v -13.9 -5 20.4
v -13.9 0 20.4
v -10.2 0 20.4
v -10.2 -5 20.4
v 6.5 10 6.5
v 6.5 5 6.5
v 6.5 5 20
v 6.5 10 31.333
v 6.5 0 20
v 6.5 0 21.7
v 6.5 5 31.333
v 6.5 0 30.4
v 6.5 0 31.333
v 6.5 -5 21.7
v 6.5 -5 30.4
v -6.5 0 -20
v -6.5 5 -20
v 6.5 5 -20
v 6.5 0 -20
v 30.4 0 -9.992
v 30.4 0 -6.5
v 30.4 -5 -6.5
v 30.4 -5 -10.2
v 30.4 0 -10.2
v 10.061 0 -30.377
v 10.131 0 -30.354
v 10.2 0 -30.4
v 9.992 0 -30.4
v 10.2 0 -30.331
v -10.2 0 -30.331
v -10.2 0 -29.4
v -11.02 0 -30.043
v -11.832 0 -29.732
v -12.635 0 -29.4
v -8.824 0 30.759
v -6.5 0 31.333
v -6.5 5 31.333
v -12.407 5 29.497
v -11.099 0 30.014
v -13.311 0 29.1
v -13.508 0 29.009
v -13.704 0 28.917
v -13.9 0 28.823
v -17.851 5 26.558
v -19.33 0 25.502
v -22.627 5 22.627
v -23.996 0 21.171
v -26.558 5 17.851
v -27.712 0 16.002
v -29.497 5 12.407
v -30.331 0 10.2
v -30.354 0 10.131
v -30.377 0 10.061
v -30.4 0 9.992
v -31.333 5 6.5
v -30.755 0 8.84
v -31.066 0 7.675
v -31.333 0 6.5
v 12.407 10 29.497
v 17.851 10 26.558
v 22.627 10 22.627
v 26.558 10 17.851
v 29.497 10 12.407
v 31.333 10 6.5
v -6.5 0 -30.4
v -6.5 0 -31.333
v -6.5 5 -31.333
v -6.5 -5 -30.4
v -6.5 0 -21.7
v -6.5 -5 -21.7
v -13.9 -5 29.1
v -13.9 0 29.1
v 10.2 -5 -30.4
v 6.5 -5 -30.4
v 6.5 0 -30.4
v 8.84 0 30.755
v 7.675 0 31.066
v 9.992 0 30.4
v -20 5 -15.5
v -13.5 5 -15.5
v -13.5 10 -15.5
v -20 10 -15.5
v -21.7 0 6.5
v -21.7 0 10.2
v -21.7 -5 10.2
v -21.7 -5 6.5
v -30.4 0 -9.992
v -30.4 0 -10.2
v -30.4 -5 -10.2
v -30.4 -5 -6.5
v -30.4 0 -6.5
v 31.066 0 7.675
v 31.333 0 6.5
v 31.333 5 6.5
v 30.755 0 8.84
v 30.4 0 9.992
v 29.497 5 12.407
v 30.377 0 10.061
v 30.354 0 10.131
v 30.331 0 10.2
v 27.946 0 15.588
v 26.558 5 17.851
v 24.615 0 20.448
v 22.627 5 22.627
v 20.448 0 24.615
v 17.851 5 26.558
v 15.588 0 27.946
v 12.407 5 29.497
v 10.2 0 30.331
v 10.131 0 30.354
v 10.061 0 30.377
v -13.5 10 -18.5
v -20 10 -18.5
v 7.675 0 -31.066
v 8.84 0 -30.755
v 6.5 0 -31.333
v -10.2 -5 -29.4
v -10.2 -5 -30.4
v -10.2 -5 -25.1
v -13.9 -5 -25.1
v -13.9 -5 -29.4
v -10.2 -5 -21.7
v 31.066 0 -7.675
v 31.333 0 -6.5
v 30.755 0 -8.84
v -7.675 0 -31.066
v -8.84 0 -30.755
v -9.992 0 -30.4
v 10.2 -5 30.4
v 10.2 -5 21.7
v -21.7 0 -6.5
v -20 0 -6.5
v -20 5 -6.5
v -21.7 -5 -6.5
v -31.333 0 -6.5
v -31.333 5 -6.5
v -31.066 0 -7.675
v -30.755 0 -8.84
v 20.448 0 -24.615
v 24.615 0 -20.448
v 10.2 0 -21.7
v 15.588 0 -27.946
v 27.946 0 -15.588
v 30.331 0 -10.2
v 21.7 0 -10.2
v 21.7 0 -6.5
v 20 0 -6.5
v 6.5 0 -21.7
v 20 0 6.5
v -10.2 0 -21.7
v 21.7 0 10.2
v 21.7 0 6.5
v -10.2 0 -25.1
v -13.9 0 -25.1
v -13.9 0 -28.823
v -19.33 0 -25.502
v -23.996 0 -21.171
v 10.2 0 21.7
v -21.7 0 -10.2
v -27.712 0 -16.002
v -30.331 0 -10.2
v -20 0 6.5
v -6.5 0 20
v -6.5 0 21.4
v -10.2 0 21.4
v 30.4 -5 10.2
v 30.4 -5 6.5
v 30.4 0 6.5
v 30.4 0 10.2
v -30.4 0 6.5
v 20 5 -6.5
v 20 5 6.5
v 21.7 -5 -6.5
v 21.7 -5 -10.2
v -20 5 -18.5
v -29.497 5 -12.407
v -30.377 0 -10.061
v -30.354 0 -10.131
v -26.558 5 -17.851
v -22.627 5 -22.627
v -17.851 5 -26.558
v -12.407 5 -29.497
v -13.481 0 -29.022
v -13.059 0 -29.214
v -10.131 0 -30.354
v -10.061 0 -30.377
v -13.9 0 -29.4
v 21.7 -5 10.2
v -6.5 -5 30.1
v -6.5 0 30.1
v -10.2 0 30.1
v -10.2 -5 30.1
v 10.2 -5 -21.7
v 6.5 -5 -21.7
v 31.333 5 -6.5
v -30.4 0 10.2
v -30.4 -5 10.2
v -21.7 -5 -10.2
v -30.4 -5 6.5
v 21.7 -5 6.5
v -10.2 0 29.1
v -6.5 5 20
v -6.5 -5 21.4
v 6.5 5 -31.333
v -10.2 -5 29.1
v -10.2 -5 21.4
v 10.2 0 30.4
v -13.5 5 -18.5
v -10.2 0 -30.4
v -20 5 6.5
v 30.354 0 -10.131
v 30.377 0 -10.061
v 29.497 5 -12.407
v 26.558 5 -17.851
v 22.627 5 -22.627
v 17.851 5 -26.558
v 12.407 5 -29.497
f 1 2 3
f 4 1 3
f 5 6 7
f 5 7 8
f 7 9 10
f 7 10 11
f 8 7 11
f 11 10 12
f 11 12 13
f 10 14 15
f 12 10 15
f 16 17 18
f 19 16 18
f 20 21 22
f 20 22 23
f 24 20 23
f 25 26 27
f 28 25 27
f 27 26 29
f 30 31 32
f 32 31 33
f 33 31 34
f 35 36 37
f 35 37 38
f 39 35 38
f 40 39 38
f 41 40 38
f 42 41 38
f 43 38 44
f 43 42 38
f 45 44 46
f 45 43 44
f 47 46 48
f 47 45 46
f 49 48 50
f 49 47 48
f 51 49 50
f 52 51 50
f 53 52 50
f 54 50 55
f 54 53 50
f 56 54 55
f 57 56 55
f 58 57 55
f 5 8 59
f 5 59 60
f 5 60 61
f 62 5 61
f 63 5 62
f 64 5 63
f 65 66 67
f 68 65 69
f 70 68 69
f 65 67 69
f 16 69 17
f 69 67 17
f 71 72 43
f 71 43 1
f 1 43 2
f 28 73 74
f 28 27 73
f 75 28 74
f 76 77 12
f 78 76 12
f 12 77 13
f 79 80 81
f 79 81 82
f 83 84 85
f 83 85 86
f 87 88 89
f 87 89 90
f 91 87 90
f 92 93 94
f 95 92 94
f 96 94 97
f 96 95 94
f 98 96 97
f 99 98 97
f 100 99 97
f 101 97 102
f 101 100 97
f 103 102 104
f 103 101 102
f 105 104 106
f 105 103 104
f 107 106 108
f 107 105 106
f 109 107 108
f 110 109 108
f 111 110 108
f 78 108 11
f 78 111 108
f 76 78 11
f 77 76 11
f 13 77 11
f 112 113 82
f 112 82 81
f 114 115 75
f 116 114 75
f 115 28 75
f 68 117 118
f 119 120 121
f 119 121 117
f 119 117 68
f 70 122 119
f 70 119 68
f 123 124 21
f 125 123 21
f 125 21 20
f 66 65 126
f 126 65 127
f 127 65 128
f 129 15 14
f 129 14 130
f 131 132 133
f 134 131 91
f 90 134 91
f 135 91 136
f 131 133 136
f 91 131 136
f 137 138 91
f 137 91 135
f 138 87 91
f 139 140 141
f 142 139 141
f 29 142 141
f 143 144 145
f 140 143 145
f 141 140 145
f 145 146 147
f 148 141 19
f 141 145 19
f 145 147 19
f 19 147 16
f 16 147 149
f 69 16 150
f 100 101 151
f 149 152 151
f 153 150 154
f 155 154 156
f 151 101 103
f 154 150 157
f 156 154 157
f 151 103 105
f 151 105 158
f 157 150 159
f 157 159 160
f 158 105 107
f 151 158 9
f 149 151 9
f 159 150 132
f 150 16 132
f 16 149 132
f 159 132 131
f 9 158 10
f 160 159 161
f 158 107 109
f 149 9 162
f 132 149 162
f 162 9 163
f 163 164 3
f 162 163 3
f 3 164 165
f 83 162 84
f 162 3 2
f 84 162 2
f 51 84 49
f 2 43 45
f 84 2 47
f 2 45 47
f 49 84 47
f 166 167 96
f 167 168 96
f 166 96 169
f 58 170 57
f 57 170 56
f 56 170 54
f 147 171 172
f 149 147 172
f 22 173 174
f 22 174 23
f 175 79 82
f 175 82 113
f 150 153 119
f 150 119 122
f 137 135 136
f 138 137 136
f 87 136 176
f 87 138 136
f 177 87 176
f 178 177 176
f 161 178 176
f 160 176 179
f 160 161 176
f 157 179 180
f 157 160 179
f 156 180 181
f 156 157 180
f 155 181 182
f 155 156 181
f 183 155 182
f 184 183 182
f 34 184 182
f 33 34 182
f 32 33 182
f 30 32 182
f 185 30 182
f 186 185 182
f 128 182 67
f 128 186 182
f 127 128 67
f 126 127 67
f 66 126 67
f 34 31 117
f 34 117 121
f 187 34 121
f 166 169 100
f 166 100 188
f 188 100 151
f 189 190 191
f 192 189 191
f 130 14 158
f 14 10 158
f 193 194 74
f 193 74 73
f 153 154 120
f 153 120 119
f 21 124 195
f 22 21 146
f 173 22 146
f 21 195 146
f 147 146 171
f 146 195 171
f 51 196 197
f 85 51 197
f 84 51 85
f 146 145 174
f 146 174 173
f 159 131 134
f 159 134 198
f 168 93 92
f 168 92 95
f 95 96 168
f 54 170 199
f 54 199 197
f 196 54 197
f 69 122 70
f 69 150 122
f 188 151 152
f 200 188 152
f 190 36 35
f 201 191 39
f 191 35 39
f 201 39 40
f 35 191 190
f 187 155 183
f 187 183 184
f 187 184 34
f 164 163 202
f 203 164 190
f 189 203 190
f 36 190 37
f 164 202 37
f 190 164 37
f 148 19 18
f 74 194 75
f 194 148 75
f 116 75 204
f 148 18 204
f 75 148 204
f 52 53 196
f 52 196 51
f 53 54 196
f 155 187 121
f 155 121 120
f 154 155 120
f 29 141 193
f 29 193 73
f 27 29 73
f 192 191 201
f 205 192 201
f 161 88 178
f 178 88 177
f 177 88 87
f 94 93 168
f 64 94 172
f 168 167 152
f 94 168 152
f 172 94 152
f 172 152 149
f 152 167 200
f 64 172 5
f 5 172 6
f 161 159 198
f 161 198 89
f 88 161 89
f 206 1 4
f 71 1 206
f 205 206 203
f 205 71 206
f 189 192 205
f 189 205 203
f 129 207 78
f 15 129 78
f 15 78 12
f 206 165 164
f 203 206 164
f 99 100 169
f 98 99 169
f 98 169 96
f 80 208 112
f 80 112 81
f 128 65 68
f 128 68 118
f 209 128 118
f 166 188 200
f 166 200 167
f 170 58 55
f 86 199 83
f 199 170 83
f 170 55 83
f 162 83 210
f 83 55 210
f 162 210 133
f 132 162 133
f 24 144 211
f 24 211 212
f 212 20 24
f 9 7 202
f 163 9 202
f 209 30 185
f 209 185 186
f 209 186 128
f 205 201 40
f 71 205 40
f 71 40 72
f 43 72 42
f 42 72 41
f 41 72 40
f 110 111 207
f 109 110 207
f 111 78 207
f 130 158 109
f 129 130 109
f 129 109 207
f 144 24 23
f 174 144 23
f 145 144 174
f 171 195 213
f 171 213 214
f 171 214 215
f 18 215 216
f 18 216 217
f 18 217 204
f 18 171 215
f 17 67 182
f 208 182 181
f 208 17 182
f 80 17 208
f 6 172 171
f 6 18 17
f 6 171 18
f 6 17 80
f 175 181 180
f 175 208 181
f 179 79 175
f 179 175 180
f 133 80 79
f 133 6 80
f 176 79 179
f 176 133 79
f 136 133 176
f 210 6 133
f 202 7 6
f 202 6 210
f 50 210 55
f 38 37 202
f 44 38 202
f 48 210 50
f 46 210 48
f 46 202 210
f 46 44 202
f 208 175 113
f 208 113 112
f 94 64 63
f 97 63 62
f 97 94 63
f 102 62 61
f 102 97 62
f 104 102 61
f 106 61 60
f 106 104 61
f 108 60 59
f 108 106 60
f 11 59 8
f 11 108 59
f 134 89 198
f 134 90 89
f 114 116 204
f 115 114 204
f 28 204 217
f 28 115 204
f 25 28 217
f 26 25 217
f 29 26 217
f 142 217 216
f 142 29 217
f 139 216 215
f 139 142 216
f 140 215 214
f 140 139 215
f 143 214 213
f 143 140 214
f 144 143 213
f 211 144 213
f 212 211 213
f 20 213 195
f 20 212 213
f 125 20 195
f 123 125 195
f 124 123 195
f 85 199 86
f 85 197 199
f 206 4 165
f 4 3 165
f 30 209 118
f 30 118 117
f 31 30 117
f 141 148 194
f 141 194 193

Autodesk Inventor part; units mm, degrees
ref_plane "YZ Plane" through (0, 0, 0) normal (1, 0, 0) x (0, 1, 0)
ref_plane "XZ Plane" through (0, 0, 0) normal (0, 1, 0) x (-1, 0, 0)
ref_plane "XY Plane" through (0, 0, 0) normal (0, 0, 1) x (1, 0, 0)
sketch "Sketch4" plane through (0, 0, 0) normal (0, 1, 0) x (-1, 0, 0)
  circle A0 centre (0, 0) radius 32
  dimension "d48" = 64
extrude "Extrusion1" add sketch "Sketch4" along normal blind 5
sketch "Sketch5" plane through (0, 5, 0) normal (0, 1, 0) x (1, 0, 0)
  line L0 (-6.5, -32) -> (6.5, -32)
  line L1 (6.5, -32) -> (6.5, -20)
  line L2 (6.5, -20) -> (-6.5, -20)
  line L3 (-6.5, -20) -> (-6.5, -32)
  line L4 (-32, -6.5) -> (-20, -6.5)
  line L5 (-20, -6.5) -> (-20, 6.5)
  line L6 (-20, 6.5) -> (-32, 6.5)
  line L7 (-32, 6.5) -> (-32, -6.5)
  line L8 (-6.5, 20) -> (6.5, 20)
  line L9 (6.5, 20) -> (6.5, 32)
  line L10 (6.5, 32) -> (-6.5, 32)
  line L11 (-6.5, 32) -> (-6.5, 20)
  line L12 (20, -6.5) -> (32, -6.5)
  line L13 (32, -6.5) -> (32, 6.5)
  line L14 (32, 6.5) -> (20, 6.5)
  line L15 (20, 6.5) -> (20, -6.5)
  line L16 (0, 0) -> (-6.9492, 0)
  line L17 (0, 0) -> (0, 8.4834)
  dimension "d51" = 13
  dimension "d52" = 12
  dimension "d53" = 12
  dimension "d54" = 13
  dimension "d57" = 13
  dimension "d58" = 12
  dimension "d59" = 12
  dimension "d60" = 13
  dimension "d61" = 40
  dimension "d62" = 40
extrude "Extrusion2" cut sketch "Sketch5" against normal blind 5
sketch "Sketch6" plane through (0, 5, 0) normal (0, 1, 0) x (1, 0, 0)
  arc A0 (6.5, -31.3329) -> (31.3329, -6.5) centre (0, 0) ccw projected
  line L0 (31.3329, -6.5) -> (6.5, -6.5)
  line L1 (6.5, -6.5) -> (6.5, -31.3329)
  line L2 (6.5, -31.3329) -> (6.5, -20) projected
  arc A1 (6.5, -31.3329) -> (31.3329, -6.5) centre (0, 0) ccw
extrude "Extrusion3" add sketch "Sketch6" along normal blind 5
sketch "Sketch7" plane through (0, 5, 0) normal (0, 1, 0) x (1, 0, 0)
  line L0 (-20, 6.5) -> (-20, -6.5) projected
  line L1 (-20, 6.5) -> (-20, 20)
  line L2 (6.5, 20) -> (-6.5, 20) projected
  line L3 (-6.5, 20) -> (-20, 20)
  line L4 (-20, 18.5) -> (-13.5, 18.5)
  line L5 (-13.5, 18.5) -> (-13.5, 15.5)
  line L6 (-13.5, 15.5) -> (-20, 15.5)
  line L7 (-20, 15.5) -> (-20, 18.5)
  line L8 (-6.5, 20) -> (-6.5, 31.3329) projected
  point P0 (0, 0)
  dimension "d69" = 7
  dimension "d70" = 1.5
  dimension "d71" = 6.5
  dimension "d72" = 3
extrude "Extrusion4" add sketch "Sketch7" along normal blind 5
sketch "Sketch8" plane through (0, 0, 0) normal (0, -1, 0) x (1, 0, 0)
  point P0 (0, 0)
sketch "Sketch9" plane through (0, 0, 0) normal (0, -1, 0) x (1, 0, 0)
  line L0 (-31.3329, -6.5) -> (-20, -6.5) projected
  line L1 (-30.4, -6.5) -> (-21.7, -6.5)
  line L2 (-21.7, -6.5) -> (-21.7, -10.2)
  line L3 (-21.7, -10.2) -> (-30.4, -10.2)
  line L4 (-30.4, -10.2) -> (-30.4, -6.5)
  line L5 (-20, 6.5) -> (-31.3329, 6.5) projected
  line L6 (-21.7, 6.5) -> (-30.4, 6.5)
  line L7 (-30.4, 6.5) -> (-30.4, 10.2)
  line L8 (-30.4, 10.2) -> (-21.7, 10.2)
  line L9 (-21.7, 10.2) -> (-21.7, 6.5)
  line L10 (6.5, 31.3329) -> (6.5, 20) projected
  line L11 (6.5, 21.7) -> (10.2, 21.7)
  line L12 (10.2, 21.7) -> (10.2, 30.4)
  line L13 (10.2, 30.4) -> (6.5, 30.4)
  line L14 (6.5, 30.4) -> (6.5, 21.7)
  line L15 (6.5, -31.3329) -> (6.5, -20) projected
  line L16 (6.5, -21.7) -> (10.2, -21.7)
  line L17 (10.2, -21.7) -> (10.2, -30.4)
  line L18 (10.2, -30.4) -> (6.5, -30.4)
  line L19 (6.5, -30.4) -> (6.5, -21.7)
  line L20 (20, 6.5) -> (31.3329, 6.5) projected
  line L21 (21.7, 6.5) -> (30.4, 6.5)
  line L22 (30.4, 6.5) -> (30.4, 10.2)
  line L23 (30.4, 10.2) -> (21.7, 10.2)
  line L24 (21.7, 10.2) -> (21.7, 6.5)
  line L25 (21.7, -6.5) -> (30.4, -6.5)
  line L26 (30.4, -6.5) -> (30.4, -10.2)
  line L27 (30.4, -10.2) -> (21.7, -10.2)
  line L28 (21.7, -10.2) -> (21.7, -6.5)
  line L29 (-6.5, -20) -> (-6.5, -31.3329) projected
  line L30 (-6.5, -30.4) -> (-10.2, -30.4)
  line L31 (-10.2, -30.4) -> (-10.2, -21.7)
  line L32 (-10.2, -21.7) -> (-6.5, -21.7)
  line L33 (-6.5, -21.7) -> (-6.5, -30.4)
  line L34 (-6.5, 31.3329) -> (-6.5, 20) projected
  line L35 (-10.2, 21.4) -> (-6.5, 21.4)
  line L36 (-6.5, 21.4) -> (-6.5, 30.1)
  line L37 (-6.5, 30.1) -> (-10.2, 30.1)
  line L38 (-10.2, 30.1) -> (-10.2, 21.4)
  line L39 (-6.5, -20) -> (6.5, -20) projected
  line L40 (20, -6.5) -> (20, 6.5) projected
  line L41 (6.5, 20) -> (-6.5, 20) projected
  line L42 (-20, 6.5) -> (-20, -6.5) projected
  line L43 (-10.2, -29.4) -> (-13.9, -29.4)
  line L44 (-13.9, -29.4) -> (-13.9, -25.1)
  line L45 (-13.9, -25.1) -> (-10.2, -25.1)
  line L46 (-10.2, -25.1) -> (-10.2, -29.4)
  line L47 (-13.9, 20.4) -> (-10.2, 20.4)
  line L48 (-10.2, 20.4) -> (-10.2, 29.1)
  line L49 (-10.2, 29.1) -> (-13.9, 29.1)
  line L50 (-13.9, 29.1) -> (-13.9, 20.4)
  point P0 (0, 0)
  dimension "d75" = 1.7
  dimension "d76" = 8.7
  dimension "d77" = 3.7
  dimension "d78" = 1.7
  dimension "d79" = 8.7
  dimension "d80" = 3.7
  dimension "d81" = 1.7
  dimension "d82" = 3.7
  dimension "d83" = 8.7
  dimension "d84" = 3.7
  dimension "d85" = 8.7
  dimension "d86" = 8.7
  dimension "d87" = 1.7
  dimension "d90" = 1.7
  dimension "d91" = 8.7
  dimension "d96" = 3.7
  dimension "d97" = 4.3
  dimension "d98" = 1
  dimension "d101" = 10.1
  dimension "d102" = 3.7
  dimension "d103" = 8.7
  dimension "d104" = 1
extrude "Extrusion5" add sketch "Sketch9" along normal blind 5
properties part number "Circuit"
